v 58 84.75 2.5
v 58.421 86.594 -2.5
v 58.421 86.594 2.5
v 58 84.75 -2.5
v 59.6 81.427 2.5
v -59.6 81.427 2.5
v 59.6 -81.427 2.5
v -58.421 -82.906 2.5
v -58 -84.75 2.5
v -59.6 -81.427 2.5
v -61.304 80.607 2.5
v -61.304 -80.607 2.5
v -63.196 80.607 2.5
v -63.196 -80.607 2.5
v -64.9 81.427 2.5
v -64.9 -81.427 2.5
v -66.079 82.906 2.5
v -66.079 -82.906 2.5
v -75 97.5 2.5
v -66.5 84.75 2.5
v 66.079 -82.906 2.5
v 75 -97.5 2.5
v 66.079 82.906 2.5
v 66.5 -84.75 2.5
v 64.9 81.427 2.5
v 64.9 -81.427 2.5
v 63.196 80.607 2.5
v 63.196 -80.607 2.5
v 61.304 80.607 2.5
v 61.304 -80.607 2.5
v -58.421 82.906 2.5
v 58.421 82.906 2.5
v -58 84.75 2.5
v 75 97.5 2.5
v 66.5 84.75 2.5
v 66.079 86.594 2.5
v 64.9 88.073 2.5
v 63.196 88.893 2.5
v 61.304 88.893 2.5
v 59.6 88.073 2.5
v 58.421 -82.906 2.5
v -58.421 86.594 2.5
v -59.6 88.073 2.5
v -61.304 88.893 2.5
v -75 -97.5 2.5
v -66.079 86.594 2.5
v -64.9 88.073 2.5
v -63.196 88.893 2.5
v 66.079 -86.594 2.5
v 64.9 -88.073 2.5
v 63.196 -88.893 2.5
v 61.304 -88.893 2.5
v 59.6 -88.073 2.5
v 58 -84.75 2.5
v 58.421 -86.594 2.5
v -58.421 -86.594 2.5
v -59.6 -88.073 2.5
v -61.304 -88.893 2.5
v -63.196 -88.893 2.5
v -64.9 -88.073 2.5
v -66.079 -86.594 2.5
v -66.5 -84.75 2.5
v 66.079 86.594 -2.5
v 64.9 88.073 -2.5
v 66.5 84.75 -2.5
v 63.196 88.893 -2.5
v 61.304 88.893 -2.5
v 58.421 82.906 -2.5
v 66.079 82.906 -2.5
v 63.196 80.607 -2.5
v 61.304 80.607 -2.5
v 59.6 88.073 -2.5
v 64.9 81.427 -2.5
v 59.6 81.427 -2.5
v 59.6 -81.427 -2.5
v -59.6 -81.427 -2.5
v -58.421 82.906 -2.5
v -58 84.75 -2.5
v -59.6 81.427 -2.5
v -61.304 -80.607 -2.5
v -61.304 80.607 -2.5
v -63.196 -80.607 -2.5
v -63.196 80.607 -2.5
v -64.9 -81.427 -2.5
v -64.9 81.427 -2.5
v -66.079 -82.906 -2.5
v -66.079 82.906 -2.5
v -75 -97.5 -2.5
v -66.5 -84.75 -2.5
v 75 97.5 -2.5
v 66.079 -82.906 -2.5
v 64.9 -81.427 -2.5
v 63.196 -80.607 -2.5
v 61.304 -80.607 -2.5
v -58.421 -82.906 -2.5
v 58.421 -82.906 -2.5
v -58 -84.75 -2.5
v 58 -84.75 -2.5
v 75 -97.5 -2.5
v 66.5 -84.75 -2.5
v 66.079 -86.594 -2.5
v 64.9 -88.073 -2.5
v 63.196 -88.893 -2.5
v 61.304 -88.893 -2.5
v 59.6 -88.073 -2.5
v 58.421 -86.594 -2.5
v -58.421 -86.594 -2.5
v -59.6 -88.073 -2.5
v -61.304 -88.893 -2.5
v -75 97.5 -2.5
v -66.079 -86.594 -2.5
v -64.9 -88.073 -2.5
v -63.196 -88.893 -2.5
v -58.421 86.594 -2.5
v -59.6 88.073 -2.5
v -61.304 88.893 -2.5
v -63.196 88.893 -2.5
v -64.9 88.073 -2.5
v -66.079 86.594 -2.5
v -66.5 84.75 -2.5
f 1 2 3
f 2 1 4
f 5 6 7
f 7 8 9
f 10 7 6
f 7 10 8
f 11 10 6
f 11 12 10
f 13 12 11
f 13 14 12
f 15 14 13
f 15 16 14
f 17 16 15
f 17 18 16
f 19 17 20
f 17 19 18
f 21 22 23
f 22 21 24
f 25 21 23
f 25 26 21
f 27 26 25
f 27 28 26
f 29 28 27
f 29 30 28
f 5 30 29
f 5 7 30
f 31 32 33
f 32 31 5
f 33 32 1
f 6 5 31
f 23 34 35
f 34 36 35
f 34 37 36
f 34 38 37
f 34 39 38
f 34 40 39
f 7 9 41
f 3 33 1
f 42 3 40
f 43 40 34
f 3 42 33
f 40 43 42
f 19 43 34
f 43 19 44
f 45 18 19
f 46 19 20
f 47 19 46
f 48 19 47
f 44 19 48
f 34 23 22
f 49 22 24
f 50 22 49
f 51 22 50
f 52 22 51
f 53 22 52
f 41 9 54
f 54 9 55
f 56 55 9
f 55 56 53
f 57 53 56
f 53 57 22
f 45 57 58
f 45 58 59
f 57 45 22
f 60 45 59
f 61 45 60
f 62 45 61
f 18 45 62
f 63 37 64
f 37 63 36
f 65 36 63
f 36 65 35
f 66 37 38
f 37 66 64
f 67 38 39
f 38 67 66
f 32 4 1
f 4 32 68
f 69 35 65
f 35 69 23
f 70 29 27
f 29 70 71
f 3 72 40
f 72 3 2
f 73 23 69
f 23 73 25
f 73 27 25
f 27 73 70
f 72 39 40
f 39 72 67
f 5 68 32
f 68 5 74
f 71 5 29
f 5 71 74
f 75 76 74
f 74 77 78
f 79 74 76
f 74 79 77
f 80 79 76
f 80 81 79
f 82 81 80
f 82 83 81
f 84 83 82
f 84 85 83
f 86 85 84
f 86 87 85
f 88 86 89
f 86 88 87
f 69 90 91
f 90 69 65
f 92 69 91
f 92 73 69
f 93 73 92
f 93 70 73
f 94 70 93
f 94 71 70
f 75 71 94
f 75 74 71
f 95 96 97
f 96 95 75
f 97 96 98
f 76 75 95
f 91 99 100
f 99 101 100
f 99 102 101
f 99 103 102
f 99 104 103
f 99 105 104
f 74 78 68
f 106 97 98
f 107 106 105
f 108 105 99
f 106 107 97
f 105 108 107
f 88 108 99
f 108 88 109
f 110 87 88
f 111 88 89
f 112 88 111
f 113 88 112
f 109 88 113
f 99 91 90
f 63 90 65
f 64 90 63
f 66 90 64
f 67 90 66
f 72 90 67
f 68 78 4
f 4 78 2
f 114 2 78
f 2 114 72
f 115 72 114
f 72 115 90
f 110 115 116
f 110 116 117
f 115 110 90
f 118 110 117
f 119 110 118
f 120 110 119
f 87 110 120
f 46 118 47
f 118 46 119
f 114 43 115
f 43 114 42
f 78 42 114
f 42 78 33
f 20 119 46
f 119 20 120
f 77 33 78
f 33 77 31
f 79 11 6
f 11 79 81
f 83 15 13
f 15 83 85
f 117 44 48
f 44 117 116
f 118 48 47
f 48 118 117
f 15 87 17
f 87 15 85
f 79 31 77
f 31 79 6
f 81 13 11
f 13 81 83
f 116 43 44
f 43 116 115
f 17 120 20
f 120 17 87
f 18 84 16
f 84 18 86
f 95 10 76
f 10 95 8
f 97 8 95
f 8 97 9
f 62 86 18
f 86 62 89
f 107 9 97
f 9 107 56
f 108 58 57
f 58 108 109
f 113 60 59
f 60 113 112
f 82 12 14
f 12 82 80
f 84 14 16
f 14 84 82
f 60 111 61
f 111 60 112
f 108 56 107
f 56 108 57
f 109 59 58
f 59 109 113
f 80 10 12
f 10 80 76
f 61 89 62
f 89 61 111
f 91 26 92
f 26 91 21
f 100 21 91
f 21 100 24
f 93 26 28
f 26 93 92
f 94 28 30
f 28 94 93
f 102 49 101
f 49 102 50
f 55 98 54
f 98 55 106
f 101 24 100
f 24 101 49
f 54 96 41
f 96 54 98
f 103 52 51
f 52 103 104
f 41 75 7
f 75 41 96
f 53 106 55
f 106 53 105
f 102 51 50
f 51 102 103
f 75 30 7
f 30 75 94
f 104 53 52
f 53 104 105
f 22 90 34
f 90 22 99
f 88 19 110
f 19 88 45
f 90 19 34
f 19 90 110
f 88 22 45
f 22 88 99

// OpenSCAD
// Generated by SolidPython 1.1.3 on 2024-01-09 11:18:42


difference() {
	cube(center = true, size = [150, 195.0000000000, 5]);
	union() {
		translate(v = [62.2500000000, 84.7500000000]) {
			cylinder(center = true, h = 5, r = 4.2500000000);
		}
		translate(v = [-62.2500000000, 84.7500000000]) {
			cylinder(center = true, h = 5, r = 4.2500000000);
		}
		translate(v = [-62.2500000000, -84.7500000000]) {
			cylinder(center = true, h = 5, r = 4.2500000000);
		}
		translate(v = [62.2500000000, -84.7500000000]) {
			cylinder(center = true, h = 5, r = 4.2500000000);
		}
	}
}
/***********************************************
*********      SolidPython code:      **********
************************************************
 
import solid
import numpy as np
import numbers
import pudb
from solid.utils import *
import viewscad
import subprocess
import os
import os.path as osp
import math
import sys

chamfer_extrude=solid.import_scad("./chamfer_extrude.scad")
chamfer_extrude=chamfer_extrude.chamfer_extrude
r = viewscad.Renderer(width=800, height=800)

def debug(model,f_name,path="/home/ts/code/projects/mfd/designs/debug"):
    solid.scad_render_to_file(model,osp.join(path,f_name)+".scad")
#generate position list of wells using offset from center
wells_pos_from_center_4 = lambda offset: [[-offset,offset],
                                        [offset, offset],
                                        [-offset, -offset],
                                        [offset, -offset]]
wells_pos_from_center_2 = lambda offset: [[offset,0],
                                        [-offset,0]]

def make_well(dims,shape=None,height=None,dxf=False):
    def circle_cylinder():
        if dxf or (height is None):
            well = solid.circle(r=dims, segments=64)
        else:
            well = solid.cylinder(r=dims, h=height, segments=64, center = True)
        return well
    if dims is None:
        sys.exit("radius needs to be a number")
    if isinstance(dims, numbers.Number):
        well =circle_cylinder()
    elif len(dims)==1:
        if isinstance(dims[1], numbers.Number):
            well =circle_cylinder()
        else:
            sys.exit("radius needs to be a number")
    elif len(dims)==2:
        well = solid.square(dims,center = True)
    elif len(dims)==3:
        well = solid.cube(dims, center = True)
    return well

def wells_top_bottom(center_gap,device_dims=None,shape=None,height=None, positions = None, dxf = False,well_shape=None):
    if well_shape == None:
        well_shape = make_well(device_dims,shape=shape,height=height,dxf=dxf)
    wells = []
    if positions is None:
        offset = radius+radius/2.0
        positions = wells_pos_from_center_2(offset)
    if dxf or (height is None):
        height = 0
    for position in positions:
        if dxf:
            wells.append(solid.translate([position[0],position[1]])(well_shape))
        else:
            wells.append(solid.translate([position[0],position[1],height/2.0])(well_shape))
    return  union()(*wells)

#place wells in four corners 
def four_corner(radius,height=None, positions = None, dxf = False):
    #if well pos not specified set
    #to equally spaced by half radius
    if positions is None:
        offset = radius+radius/2.0
        positions = wells_pos_from_center_4(offset)
    if dxf or (height is None):
        height = 0
    #make wells at positions with specified radius and height
    wells = []
    for position in positions:
        #make circle if making dxf
        if dxf:
            well_shape = solid.circle(r=radius, segments=64)
            well_shape = solid.translate([position[0],position[1]])(well_shape)
        #if stl make cylinder
        else:
            well_shape = solid.cylinder(r=radius, h=height, segments=64, center = True)
            well_shape = solid.translate([position[0],position[1],height/2.0])(well_shape)
        wells.append(well_shape)
    return  union()(*wells)

#generate channels 
def make_channels(length,width,height=0,num_chans=1,max_chans=None,spacing=None, dxf = False,
                  rotate_channels=False):
    if dxf or (height is None):
        height = 0
    #if channel gap not defined, is equal to
    if spacing is None: spacing = width
    #calculate number of channels if fitting max num within given width
    if not max_chans is None:
        import math
        num_chans = math.floor((max_chans-spacing)/(width+spacing))
    #get total width of channel section  
    total_width = (width*num_chans)+(spacing*(num_chans-1))

    #make template channel
    #if rotate_channels: width, length = length, width
    if dxf:
        channel_t = solid.square([length,width],center = True)
    else:
        channel_t = solid.cube([length,width,height], center = True)

    #if number channels is even, offset the first channel to center its gap
    if num_chans % 2 == 0: centering = -(width/2.0+spacing/2.0)
    else: centering = 0
    #move template channel up to align bottom at z = 0 
    #and offset center if necessary
    if dxf:
        channel_t = solid.translate([0,centering])(channel_t)
    else:
        channel_t = solid.translate([0,centering,height/2.0])(channel_t)

    #if rotate_channels: length,width = width,length
    #start making the channels
    channels = []
    for i in range(num_chans):
        #if i=0 there is no translation
        #if i=1, we make the first channel adjacent to second
        direction = i

        #if i>=1, we add channels alternating left and right
        if i >= 1:
            direction = -(i/2.0)
            if i % 2 == 1: direction = (-direction)+0.5
                
        #make channel at right position and add it to channel list
        translation_coords = [0,direction*(width+spacing)]
        #if rotate_channels: translation_coords = [direction*(width+spacing),0]
        if dxf:
            channel = solid.translate(translation_coords)(channel_t)
        else:
            channel = solid.translate([*translation_coords,0])(channel_t)
        channels.append(channel)
    
    #group all channels as one object
    channels = union()(*channels)
    #compute the x,y,z dimensions in order to pass as arguments 
    #for construction of other parts of device (such as the chambers)
    measurements = {'x':(length/2.0,-length/2.0),
                    'y':(total_width/2.0,-total_width/2.0)}
    if not dxf:
        measurements['z'] = (height,0)
    if rotate_channels:
        channels = solid.rotate(90)(channels)
        measurements['x'],measurements['y']=measurements['y'],measurements['x']
    return channels,measurements

def make_chambers(msrs,height=None,extra=0,len_until=None,width=None, dxf = False):
    #computes x,y,z length
    total = lambda x : abs(x[0]) + abs(x[1])
    
    #if specific height if specified
    #otherwise use same height as channels
    if dxf:
        pass
    elif not height is None:
        msrs['z'] = (height,0)
    else:
        msrs['z'] = (0,0)
        
    #make copy of measurements from channels to modify chamber dimensions 
    #and add length to chambers as specified
    chamber_dims = msrs.copy()
    #calculate length of chamber to reach specified offset
    if not len_until is None:
        chamber_len = len_until-(msrs['x'][0])
    #or add specified length to channel length (if not specified, adds 0)
    else:
        chamber_len = msrs['x'][0]+extra
    #set the chamber length based 
    chamber_dims['x'] = (chamber_len/2.0,-(chamber_len/2.0))
    #compute final dimensions of chamber
    if not width is None:
        chamber_dims['y'] = (width/2.0,-width/2.0)
    chamber_dims = [total(size) for size in chamber_dims.values()]
        
    #calculate chamber translation offset to place adjacent to channels
    chamber_trslt = msrs['x'][0]+(chamber_len/2.0)
    #compute chamber translation coordinates to align with channels
    #x = 1 moves chamber above channels
    #x = -1 moves chamber below channels
    if dxf:
        trslt = lambda x : [x*(chamber_trslt),0]
    else:
        trslt = lambda x : [x*(chamber_trslt),0,msrs['z'][0]/2.0]
    
    #function to make chamber at top or at bottom 
    if dxf:
        move = lambda x : solid.translate(trslt(x))(solid.square(chamber_dims, center = True) )
    else:
        move = lambda x : solid.translate(trslt(x))(solid.cube(chamber_dims,center = True))
    #make top and bottom chambers and return them as grouped
    top = move(1)
    bottom = move(-1)
    #chambers=solid.rotate(90)(solid.union()(top,bottom))
    chambers=(solid.union()(top,bottom))

    return chambers

#create alignment features 
def alignment_features(unit,dims,grid_size, mask_size = None, alignment = "hollow", units_from_center = (2.5,2.5), corner_len=None):
    width = grid_size[0]*dims[0]
    length = grid_size[1]*dims[1]
    if mask_size is None and corner_len is None:
        corner_len = (dims[0] + dims[1]) /2 / 8
    corner = lambda thickness_div : solid.union()( solid.square([corner_len,corner_len/thickness_div],center=False), solid.square([corner_len/thickness_div,corner_len],center=False) )
    
    def make_full(thickness_div):
        thickness = corner_len/thickness_div
        tr = solid.translate([0, 0, 0 ])(solid.rotate(180)(corner(thickness_div)))
        tr = solid.translate([thickness/2,thickness/2,0])(tr)
        bl = solid.translate([0, 0, 0 ])(solid.rotate(0)(corner(thickness_div)))
        bl = solid.translate([-thickness/2,-thickness/2,0])(bl)
        return solid.union()(tr,bl)
    
    def make_hollow(thickness_div):
        thickness = corner_len/(thickness_div/2)
        inner = make_full(thickness_div)
        outer = make_full(thickness_div/2)
        hollow = outer - inner 
        return hollow
    
    center = (width /2 , length/2)
    mask_pos = lambda x,y : (center[0] + x*(float(units_from_center[0])*dims[0]), center[1] + y*(float(units_from_center[1])*dims[1]))
    positions = []
    positions.append(mask_pos(1,0))
    positions.append(mask_pos(0,1))
    positions.append(mask_pos(-1,0))
    positions.append(mask_pos(0,-1))
    make_mask = lambda mtype : make_hollow(8) if mtype == "hollow" else make_full(8)
    masks = [ solid.translate([*position,0])(make_mask(alignment)) for position in positions]
    
    solid.scad_render_to_file(solid.union()(*masks),"./designs/open_chamber/masks.scad")
    #return unit - solid.union()(*masks)
    return solid.union()(*masks,unit)

def create_outline(thickness, array, dims, grid_size,):
    width = grid_size[0]*dims[0] + thickness *2
    length = grid_size[1]*dims[1] + thickness *2
    outer = solid.translate([-thickness, -thickness,0])(solid.square([width, length]))
    return outer-array

def create_wall(wall_thickness, outline_thickness, dims, grid_size, wall_height = 2000, dxf = False):
    inner_width = grid_size[0]*dims[0] + outline_thickness *2
    inner_length = grid_size[1]*dims[1] + outline_thickness *2
    outer_width = inner_width + wall_thickness * 2
    outer_length = inner_length + wall_thickness * 2
    outer_pos_x = -outline_thickness-wall_thickness
    outer_pos_y = -outline_thickness-wall_thickness
    inner_pos_x = -outline_thickness
    inner_pos_y = -outline_thickness
    if dxf:
        inner_wall = solid.translate([inner_pos_x,
                                      inner_pos_y,
                                      0])(solid.square([inner_width, inner_length]))
        outer_wall = solid.translate([outer_pos_x,
                                      outer_pos_y,
                                      0])(solid.square([outer_width, outer_length]))

        return outer_wall-inner_wall
    else:
        inner_wall = solid.translate([inner_pos_x,
                                      inner_pos_y,
                                      0])(solid.cube([inner_width, inner_length,wall_height]))
        outer_wall = solid.translate([outer_pos_x,
                                      outer_pos_y,
                                      0])(solid.cube([outer_width, outer_length,wall_height]))

        return outer_wall-inner_wall, {'wall_height': wall_height,
                                       'wall_thickness': wall_thickness,
                                       'inner_width':inner_width,
                                       'inner_length': inner_length,
                                       'outer_width': outer_width,
                                       'outer_length': outer_length,
                                       'outer_pos_x' : outer_pos_x,
                                       'outer_pos_y' : outer_pos_y,
                                       'inner_pos_x' : inner_pos_x,
                                       'inner_pos_y' : inner_pos_y}

def create_thicker_wall(wall_thickness, outer_wall_offset, wall_dims, dims, grid_size, height_start = .2, height_end=2, dxf = False):
    addon_wall,thicker_wall_dims = create_wall(wall_thickness, outer_wall_offset, dims, grid_size, wall_height=height_end-height_start, dxf = False)
    addon_wall = solid.translate([0,0,height_start])(addon_wall)

    thicker_wall_dims['wall_height'] = height_end
    thicker_wall_dims['wall_thickness'] = wall_dims['wall_thickness'] + wall_thickness
    return addon_wall, thicker_wall_dims
 
def add_lock_to_wall(wall,wall_dims,y_offset = 0,cut_ratio=0.7,L_length=3, gap_ratio=0.05, axis="x",width_ratio=1/2):
    # Makes L shape
    def make_L(max_length,length_thickness,max_width,width_thickness,height,y_offset):
        length = solid.cube([max_length,length_thickness,height])
        width = solid.cube([width_thickness,max_width,height])
        width = solid.translate([max_length-(width_thickness),0,0])(width)
        L = solid.union()(width,length)
        debug(L,"L")
        if axis == "x":
            L = solid.rotate(-90)(L)
            L = solid.translate([0,max_length,0])(L)
        else:
            L = solid.rotate(-180)(L)
            L = solid.translate([max_length,max_width,0])(L)
        return solid.translate([0,0,y_offset])(L)
    
    lock_length = L_length
    lock_width = wall_dims['wall_thickness']*width_ratio
    lock_length_thickness = lock_width/2
    lock_width_thickness = lock_width/2
    L_lock = make_L(lock_length,lock_length_thickness,lock_width,lock_width_thickness, wall_dims['wall_height']-y_offset, y_offset)
    
    margin_space = lock_length - lock_length*(1-gap_ratio)
    key_length = lock_length-margin_space
    key_length_thickness = lock_length_thickness-(margin_space*2)
    key_width = lock_width-(margin_space*2)
    key_width_thickness = lock_width_thickness-(margin_space*2)
    L_key = make_L(key_length,key_length_thickness,key_width,key_width_thickness, wall_dims['wall_height']-y_offset, y_offset)
    L_key = solid.translate([margin_space,margin_space,0])(L_key)
    L = solid.union()(L_lock,L_key)
    debug(L,"L")
    
    #Make cube to be used as negative to split frame in a half
    #Can choose if making left or right negative, specify ratio of split
    def make_negative(right,cut_ratio):
        if axis == "x":
            if right:
                length = wall_dims['outer_length']*(1-cut_ratio)
                pos_x = wall_dims['outer_pos_x']+(wall_dims['outer_length']*cut_ratio)
            else:
                length = wall_dims['outer_length']*(cut_ratio)
                pos_x = wall_dims['outer_pos_x'] 
            negative = solid.cube([wall_dims['outer_width'],length, wall_dims['wall_height']])
            negative = solid.translate([wall_dims['outer_pos_y'],pos_x,0])(negative)
        else:
            if right:
                length = wall_dims['outer_width']*(1-cut_ratio)
                pos_x = wall_dims['outer_pos_y']+(wall_dims['outer_width']*cut_ratio)
            else:
                length = wall_dims['outer_width']*(cut_ratio)
                pos_x = wall_dims['outer_pos_y'] 
            negative = solid.cube([length,wall_dims['outer_length'], wall_dims['wall_height']])
            negative = solid.translate([pos_x,wall_dims['outer_pos_x'],0])(negative)
        return negative, pos_x, length 
                      
    #Make negatives
    negative_right, right_half_pos_x, right_half_length = make_negative(True,cut_ratio)
    negative_left, left_half_pos_x, right_half_length = make_negative(False,cut_ratio)
    #Make halves
    left_half = solid.difference()(wall,negative_right)
    right_half = solid.difference()(wall,negative_left)
    def place_L(L, L_length,L_width):
        #Place L on top wall       
        offset_to_center = (wall_dims['wall_thickness']-L_width)/2
        if axis == "x":
            y_pos_top = (wall_dims['outer_pos_y'] +
                    wall_dims['outer_width'] - 
                    L_width - offset_to_center)
            top_L = solid.translate([y_pos_top,
                                     right_half_pos_x-(L_length),
                                     0])(L)
            #Place L on bottom wall       
            y_pos_bottom = wall_dims['outer_pos_y']+offset_to_center
            bottom_L = solid.translate([y_pos_bottom,
                                        right_half_pos_x-L_length,
                                        0])(L)
        else:
            y_pos_top = (wall_dims['outer_pos_x'] +
                    wall_dims['outer_length'] -
                    (L_width+offset_to_center))
            top_L = solid.translate([right_half_pos_x-L_length,
                                     y_pos_top,
                                     0])(L)
            #Place L on bottom wall       
            y_pos_bottom = wall_dims['outer_pos_y']+offset_to_center
            bottom_L = solid.translate([right_half_pos_x-L_length,
                                        y_pos_bottom,
                                        0])(L)
        return bottom_L, top_L
    #Make complimentary L pieces through union and differences
    #Make Lock
    bottom_L_lock, top_L_lock = place_L(L_lock,L_length,lock_width)
    left_half = solid.difference()(left_half,bottom_L_lock)
    left_half = solid.difference()(left_half,top_L_lock)
    #Make Key
    bottom_L_key, top_L_key = place_L(L_key,L_length,lock_width)
    right_half = solid.union()(right_half,bottom_L_key)
    right_half = solid.union()(right_half,top_L_key)
    return left_half, right_half


#build a row x col grid of containment units
def make_unit_array(unit,dims,grid_size, dxf = False, alignment = None, mask_size = None,
                    units_from_center = None,alignment_offset=None, alignment_mark_size=1):
    units = []
    for col in range(grid_size[1]):
        for row in range(grid_size[0]):
            if dxf:
                units.append(solid.translate([row*dims[0],col*dims[1]])(unit))
            else:
                units.append(solid.translate([row*dims[0],col*dims[1],dims[2]/2.0])(unit))
    array = solid.union()(*units)
    if (not alignment is None) and dxf:
        if not alignment_offset is None:
            array = solid.translate([alignment_offset[0],alignment_offset[1]])(array)
        array = alignment_features(array,dims, grid_size, alignment = alignment, mask_size = None, units_from_center = units_from_center,corner_len=alignment_mark_size)
        if not alignment_offset is None:
            array = solid.translate([-alignment_offset[0],-alignment_offset[1]])(array)
    return array


def make_taylor(wells_pos = wells_pos_from_center_4(2.25), well_rad = 1.5 ,
                well_height = 2, chan_w = 0.01, chan_l = 1, chan_h = 0.010 ,
                chan_gap = 0.040, max_chans = None,num_chans=100, chamber_height  = 0.100,
                columns = 1, rows = 1, chamber_len_until=2.25, add_channels = True, add_wells = True, 
                add_chambers = True, save_path = "./", alignment = None, units_from_center = 2,
                mask_size = None, render_stl = False, outline_thickness = 0.050, dxf = True,
                wall_height = 15, wall_thickness = 0.95, casing_x=9, casing_y=9, casing_z=0,rotate_units=0):

    dims = [casing_x, casing_y, casing_z]
    wells = four_corner(well_rad,well_height, dxf = dxf, positions = wells_pos)
    debug(wells,"wells")
    channels, msrs = make_channels(chan_l,chan_w,chan_h,dxf=dxf, spacing = chan_gap, max_chans=max_chans,num_chans=num_chans)
    debug(channels,"channels")
    chambers = make_chambers(msrs,dxf = dxf, height=chamber_height,len_until=chamber_len_until)
    debug(chambers,"chambers")

    #add together and render
    device_parts = []
    if add_channels:
        device_parts.append(channels)
    if add_wells:
        device_parts.append(wells)
    if add_chambers:
        device_parts.append(chambers)
    device=union()(*device_parts)
    device = rotate(rotate_units)(device)

    device=solid.translate([dims[0]/2.0,dims[1]/2.0,0])(device)
    channels = rotate(rotate_units)(channels)
    channels=solid.translate([dims[0]/2,dims[1]/2,0])(channels)
    chambers_wells = union()(wells,chambers)
    chambers_wells = rotate(rotate_units)(chambers_wells)
    chambers_wells=solid.translate([dims[0]/2,dims[1]/2,0])(chambers_wells)

    file_name = str(rows)+'x'+str(columns)+'_units_'
    grid_size = [rows,columns]

    if alignment:
        alignment="full"
    device = make_unit_array(device,dims,grid_size, dxf=dxf, alignment = alignment,
                                 units_from_center = units_from_center)
    channels = make_unit_array(channels,dims,grid_size, dxf=dxf, alignment = alignment,
                                 units_from_center = units_from_center)
    if alignment=="full":
        alignment="hollow"

    chambers_wells = make_unit_array(chambers_wells,dims,grid_size, dxf=dxf, alignment = alignment,
                                 units_from_center =units_from_center)

    def save_model(model,prefix):
        model_fname = os.path.abspath(save_path+prefix+"_"+file_name+".scad")
        solid.scad_render_to_file(model,model_fname)
        return model_fname

    wells_fname = save_model(wells,"wells")
    channels_fname = save_model(channels,"channels")
    device_fname = save_model(device,"device")
    chambers_wells_fname = save_model(chambers_wells,"chambers_wells")
    return (chambers_wells,chambers_wells_fname), (channels,channels_fname), (device,device_fname)

def make_device(design='open',rows=8,columns=6,wells_pos = 4.5,well_offset=3.2, well_rad=3.2,well_height=0.1,
                chan_l=1,chan_w=0.01,chan_h=0.01,chan_gap=0.015,num_chans=101,dxf=True,save_path="./designs/open_chamber/",
                casing_x=9.0,casing_y=18.0,casing_z=0,rotate_units=90,units_from_center=(3,1),chamber_len_until=4.5,
                chamber_width=None,alignment=True, add_wells=True, add_channels=True,add_chambers=True,well_shape=None):

    dims = [casing_x, casing_y, casing_z]
    if design == "open":
        wells_pos=wells_pos_from_center_2(wells_pos)
        wells = wells_top_bottom(well_offset*2,device_dims=well_rad,height=well_height, dxf = dxf, positions = wells_pos,well_shape=well_shape)
    elif design == "closed":
        wells_pos=wells_pos_from_center_4(wells_pos)
        debug(wells,"wells")
        wells = four_corner(well_offset,well_height,device_dims=well_rad, dxf = dxf, positions = wells_pos)
    else:
        print(design+" is not a valid design.\n Choose valid design: 'open' or 'closed'")
        exit()
    wells = rotate(rotate_units)(wells)
    wells=solid.translate([dims[0]/2,dims[1]/2,0])(wells)
    debug(wells,"wells")

    channels, msrs = make_channels(chan_l,chan_w,chan_h,dxf=dxf, spacing = chan_gap, num_chans=num_chans,rotate_channels=False)
    channels = rotate(rotate_units)(channels)
    channels=solid.translate([dims[0]/2,dims[1]/2,0])(channels)

    chambers=make_chambers(msrs,height=None,extra=0,len_until=chamber_len_until, width=chamber_width,dxf = dxf)
    chambers = rotate(rotate_units)(chambers)
    chambers=solid.translate([dims[0]/2,dims[1]/2,0])(chambers)

    device_parts = []
    if add_channels:
        device_parts.append(channels)
    if add_wells:
        device_parts.append(wells)
    if add_chambers:
        device_parts.append(chambers)
    device = union()(*device_parts)
    #device = rotate(rotate_units)(device)
    #device=solid.translate([dims[0]/2.0,dims[1]/2.0,0])(device)

    chambers_wells = []
    if add_chambers:
        chambers_wells.append(chambers)
    if add_wells:
        chambers_wells.append(wells)
    chambers_wells = union()(*chambers_wells)
    #chambers_wells = union()(wells,chambers)
    #chambers_wells = rotate(rotate_units)(chambers_wells)
    #chambers_wells=solid.translate([dims[0]/2,dims[1]/2,0])(chambers_wells)

    file_name = str(rows)+'x'+str(columns)+'_units_'

    grid_size = [rows,columns]
    if alignment:
        alignment="full"
    device = make_unit_array(device,dims,grid_size, dxf=dxf, alignment = alignment,
                                 units_from_center = units_from_center)
    channels = make_unit_array(channels,dims,grid_size, dxf=dxf, alignment = alignment,
                                 units_from_center = units_from_center)
    if alignment=="full":
        alignment="hollow"

    chambers_wells = make_unit_array(chambers_wells,dims,grid_size, dxf=dxf, alignment = alignment,
                                 units_from_center =units_from_center)

    def save_model(model,prefix):
        model_fname = os.path.abspath(save_path+prefix+"_"+file_name+".scad")
        solid.scad_render_to_file(model,model_fname)
        return model_fname

    wells_fname = save_model(wells,"wells")
    channels_fname = save_model(channels,"channels")
    device_fname = save_model(device,"device")
    chambers_wells_fname = save_model(chambers_wells,"chambers_wells")
    return (chambers_wells,chambers_wells_fname), (channels,channels_fname), (device,device_fname)


def make_open_chamber(rows=8,columns=6,wells_pos = wells_pos_from_center_2(4.5), well_rad=3.2,well_height=0.1,
                      chan_l=1,chan_w=0.01,chan_h=0.01,chan_gap=0.015,num_chans=101,dxf=True,save_path="./designs/open_chamber/",
                      casing_x=9.0,casing_y=18.0,casing_z=0,rotate_units=90,units_from_center=(3,1),chamber_len_until=4.5,
                      chamber_width=None,alignment=True, add_wells=True, add_channels=True,add_chambers=True,well_shape=None):

    dims = [casing_x, casing_y, casing_z]
    wells = wells_top_bottom(well_rad,height=well_height, dxf = dxf, positions = wells_pos, well_shape=well_shape)
    channels, msrs = make_channels(chan_l,chan_w,chan_h,dxf=dxf, spacing = chan_gap, num_chans=num_chans,rotate_channels=False)
    chambers=make_chambers(msrs,height=None,extra=0,len_until=chamber_len_until, width=chamber_width,dxf = dxf)
    debug(chambers,"chambers")
    device_parts = []
    if add_channels:
        device_parts.append(channels)
    if add_wells:
        device_parts.append(wells)
    if add_chambers:
        device_parts.append(chambers)
    device = union()(*device_parts)
    device = rotate(rotate_units)(device)
    device=solid.translate([dims[0]/2.0,dims[1]/2.0,0])(device)
    channels = rotate(rotate_units)(channels)
    channels=solid.translate([dims[0]/2,dims[1]/2,0])(channels)
    chambers_wells = union()(wells,chambers)
    chambers_wells = rotate(rotate_units)(chambers_wells)
    chambers_wells=solid.translate([dims[0]/2,dims[1]/2,0])(chambers_wells)

    file_name = str(rows)+'x'+str(columns)+'_units_'

    grid_size = [rows,columns]
    if alignment:
        alignment="full"
    device = make_unit_array(device,dims,grid_size, dxf=dxf, alignment = alignment,
                                 units_from_center = units_from_center)
    channels = make_unit_array(channels,dims,grid_size, dxf=dxf, alignment = alignment,
                                 units_from_center = units_from_center)
    if alignment=="full":
        alignment="hollow"

    chambers_wells = make_unit_array(chambers_wells,dims,grid_size, dxf=dxf, alignment = alignment,
                                 units_from_center =units_from_center)

    def save_model(model,prefix):
        model_fname = os.path.abspath(save_path+prefix+"_"+file_name+".scad")
        solid.scad_render_to_file(model,model_fname)
        return model_fname

    wells_fname = save_model(wells,"wells")
    channels_fname = save_model(channels,"channels")
    device_fname = save_model(device,"device")
    chambers_wells_fname = save_model(chambers_wells,"chambers_wells")
    return (chambers_wells,chambers_wells_fname), (channels,channels_fname), (device,device_fname)

def to_dxf(scad_path):
    dxf_path = scad_path.replace(".scad",".dxf")
    subprocess.call(["openscad", "-o", dxf_path, scad_path])
    import ezdxf
    temp_dxf = ezdxf.readfile(dxf_path)
    temp_dxf.saveas(dxf_path)

#def make_walls(diameter,thickness,grid_size,dims,height=20,segments=256,make_inner=True):
#    wafer_wall_out = solid.cylinder(r=diameter/2,h=height, segments=segments)
#    wafer_wall_in = solid.cylinder(r=(diameter/2-thickness),h=height, segments=segments)
#    wafer_wall = solid.difference()(wafer_wall_out,wafer_wall_in)
#    wafer_wall = solid.translate([grid_size[1]*dims[1]/2.0,grid_size[0]*dims[0]/2.0])(wafer_wall)
#
#    vertical_wall_length = grid_size[1]*dims[1]
#    horizontal_wall_length = grid_size[0]*dims[0]
#    vertical_wall = solid.cube([vertical_wall_length,thickness,height],center = True)
#    vertical_wall = solid.translate([vertical_wall_length/2,0,height/2])(vertical_wall)
#    horizontal_wall = solid.cube([thickness,horizontal_wall_length,height],center = True)
#    horizontal_wall = solid.translate([0,vertical_wall_length/2,height/2])(horizontal_wall)
#    walls = []
#    walls.append(horizontal_wall)
#    walls.append(vertical_wall)
#    for col in range(grid_size[1]):
#        if col == grid_size[1]-1: 
#            walls.append(solid.translate([0,(col+1)*dims[1]])(vertical_wall))
#        elif col > 0 and col < grid_size[1]-1 and make_inner==True:
#            walls.append(solid.translate([0,(col+1)*dims[1]])(vertical_wall))
#    for row in range(grid_size[0]):
#        if row == grid_size[0]-1: 
#            walls.append(solid.translate([(row+1)*dims[0],0])(horizontal_wall))
#        elif row > 0 and row < grid_size[0]-1 and make_inner==True:
#            walls.append(solid.translate([(row+1)*dims[0],0])(horizontal_wall))
#    walls = union()(*walls)
#    wafer_walls = union()(walls,wafer_wall)
#    return walls,wafer_wall,wafer_walls

def make_walls(diameter,thickness,grid_size,dims,height=20,segments=256,make_inner=True,padx=0,pady=0):
    wafer_wall_out = solid.cylinder(r=diameter/2,h=height, segments=segments)
    wafer_wall_in = solid.cylinder(r=(diameter/2-thickness),h=height, segments=segments)
    wafer_wall = solid.difference()(wafer_wall_out,wafer_wall_in)
    wafer_wall = solid.translate([grid_size[1]*dims[1]/2.0,grid_size[0]*dims[0]/2.0])(wafer_wall)

    vertical_wall_length = grid_size[0]*dims[0]+padx
    horizontal_wall_length = grid_size[1]*dims[1]+pady
    vertical_wall = solid.cube([vertical_wall_length,thickness,height],center = True)
    vertical_wall = solid.translate([vertical_wall_length/2-pady/2,-padx/2,height/2])(vertical_wall)
    horizontal_wall = solid.cube([thickness,horizontal_wall_length,height],center = True)
    horizontal_wall = solid.translate([-pady/2,horizontal_wall_length/2-padx/2,height/2])(horizontal_wall)
    walls = []
    walls.append(horizontal_wall)
    walls.append(vertical_wall)
    for col in range(grid_size[1]):
        if col == grid_size[1]-1: 
            walls.append(solid.translate([0,(col+1)*dims[1]+pady])(vertical_wall))
        elif col > 0 and col < grid_size[1]-1 and make_inner==True:
            walls.append(solid.translate([0,(col+1)*dims[1]])(vertical_wall))
    for row in range(grid_size[0]):
        if row == grid_size[0]-1: 
            walls.append(solid.translate([(row+1)*dims[0]+padx,0])(horizontal_wall))
        elif row > 0 and row < grid_size[0]-1 and make_inner==True:
            walls.append(solid.translate([(row+1)*dims[0],0])(horizontal_wall))
    walls = union()(*walls)
    wafer_walls = union()(walls,wafer_wall)
    return walls,wafer_wall,wafer_walls

def save_model(model,base_path,base_name,dxf=True):
    if not os.path.exists(base_path):
        os.makedirs(base_path)
    dxf_path=osp.join(base_path,base_name+".scad")
    solid.scad_render_to_file(model,osp.join(dxf_path))
    if dxf:
        to_dxf(dxf_path)

def make_wafer(diameter,flat_len,thickness):
    wafer = solid.cylinder(r1=diameter/2,r2=diameter/2,h=thickness,segments=512,)()
    x_start_flat=(flat_len/2)
    y_start_flat = math.sqrt(((diameter/2)**2) - (x_start_flat**2) )
    height_delete_flat=diameter/2-y_start_flat
    flat_delete = solid.cube([flat_len,height_delete_flat,thickness],center=False)()
    flat_delete = solid.translate([-flat_len/2,y_start_flat,0])(flat_delete)
    wafer = solid.difference()(wafer,flat_delete)
    wafer = solid.rotate(90)(wafer)
    return wafer

def add_wafer_to_mask(wafer_size,flat_len,mask,grid_size,dims,wafer_line_thickness=0.1,outer_mask_thickness=5,alignment_offset=None):
    def make_wafer_mask(wafer_size,flat_len):
        wafer_mask = make_wafer(wafer_size,flat_len,1)
        wafer_mask = solid.projection()(wafer_mask)
        wafer_mask = solid.translate([grid_size[0]*dims[0]/2.0,grid_size[1]*dims[1]/2.0])(wafer_mask)
        if not alignment_offset is None:
            wafer_mask = solid.translate([-alignment_offset[0],-alignment_offset[1]])(wafer_mask)
        return wafer_mask

    inner_wafer_line_mask = make_wafer_mask(wafer_size-wafer_line_thickness/2,flat_len)
    outer_wafer_line_mask = make_wafer_mask(wafer_size+wafer_line_thickness/2,flat_len)
    outer_wafer_mask = make_wafer_mask(wafer_size+outer_mask_thickness,flat_len)
    outer_wafer_mask = solid.difference()(outer_wafer_mask,outer_wafer_line_mask)
    wafer_mask = solid.union()(outer_wafer_mask,inner_wafer_line_mask)

    return solid.difference()(wafer_mask,mask)

def make_posts(post_shape,post_height):
    posts = solid.linear_extrude(height=post_height)(post_shape)
    return posts

def make_wafer_empty(diameter,flat_len,thickness,margin,notch_len=20,notch_height=5,oversize=1.01):
    diameter*=oversize
    flat_len*=oversize
    wafer = make_wafer(diameter,flat_len,thickness)
    holder = solid.cylinder(r1=diameter/2+margin,r2=diameter/2+margin,h=thickness,segments=512)()
    holder = solid.difference()(holder,wafer)

    x_start_flat=(flat_len/2)
    y_start_flat = math.sqrt(((diameter/2)**2) - (x_start_flat**2) )
    height_delete_flat=diameter/2-y_start_flat
    notch = solid.cube([notch_len,notch_height,thickness],center=False)()
    notch = solid.translate([-notch_len/2,y_start_flat,0])(notch)
    notch = solid.rotate(90)(notch)
    return solid.difference()(holder,notch)

def wafer_print_calibration(diameter,thickness,height,z_offset):
    circles = []
    radii = []
    radii.append(diameter/2.0*0.8)
    radii.append(diameter/2.0*0.6)
    radii.append(diameter/2.0*0.4)
    radii.append(diameter/2.0*0.2)
    for radius in radii:
        inner = solid.cylinder(r1=radius-(thickness/2.0),r2=radius-(thickness/2.0),h=thickness,segments=512,)()
        outer = solid.cylinder(r1=radius+(thickness/2.0),r2=radius+(thickness/2.0),h=thickness,segments=512,)()
        diff = solid.difference()(outer,inner)
        circles.append(diff)
    circles = solid.union()(*circles)
    circles = solid.translate([0,0,z_offset])(circles)
    return circles

def make_rack(wells,dims,grid_size,alignment_offset,rack_x,rack_y,rack_thickness,bolt_width,add_bolts=True):

    #get X and Y dimensions of gride of pipette tips
    X_len = dims[0]*grid_size[0]
    Y_len = dims[1]*grid_size[1]
    #make rack
    rack = solid.cube([rack_x,rack_y,rack_thickness],center=True)

    if add_bolts:
    #add bolt holes
        bolt_hole=solid.cylinder(r=bolt_width/2,h=rack_thickness,center=True)()
        bolt_holes = []
        bolt_holes.append(solid.translate([rack_x/2-1.5*bolt_width,rack_y/2-1.5*bolt_width])(bolt_hole))
        bolt_holes.append(solid.translate([-rack_x/2+1.5*bolt_width,rack_y/2-1.5*bolt_width])(bolt_hole))
        bolt_holes.append(solid.translate([-rack_x/2+1.5*bolt_width,-rack_y/2+1.5*bolt_width])(bolt_hole))
        bolt_holes.append(solid.translate([rack_x/2-1.5*bolt_width,-rack_y/2+1.5*bolt_width])(bolt_hole))
        bolt_holes = solid.union()(*bolt_holes)
        rack=solid.difference()(rack,bolt_holes)
    rack_support = rack

    #center rack with pipette holes
    rack = solid.translate([0,0,rack_thickness/2])(rack)
    rack = solid.translate([X_len/2,Y_len/2])(rack)
    rack = solid.translate([-alignment_offset[0],-alignment_offset[1]])(rack)
    wells = solid.linear_extrude(height=rack_thickness)(wells)
    rack = solid.difference()(rack,wells)
    return rack, rack_support

def make_pillar(wells,dims,grid_size,alignment_offset,rack_x,rack_y,pillar_height,rack_thickness,bolt_width,add_bolts=True,taper_angle=1,bolt_position_corner=1.5):

    #get X and Y dimensions of gride of pipette tips
    X_len = dims[0]*grid_size[0]
    Y_len = dims[1]*grid_size[1]
    #make rack
    rack = solid.cube([rack_x,rack_y,rack_thickness],center=True)
    
    if add_bolts:
    #add bolt holes
        bolt_hole=solid.cylinder(r=bolt_width/2,h=rack_thickness,center=True)()
        bolt_holes = []
        bolt_holes.append(solid.translate([rack_x/2-bolt_position_corner*bolt_width,rack_y/2-bolt_position_corner*bolt_width])(bolt_hole))
        bolt_holes.append(solid.translate([-rack_x/2+bolt_position_corner*bolt_width,rack_y/2-bolt_position_corner*bolt_width])(bolt_hole))
        bolt_holes.append(solid.translate([-rack_x/2+bolt_position_corner*bolt_width,-rack_y/2+bolt_position_corner*bolt_width])(bolt_hole))
        bolt_holes.append(solid.translate([rack_x/2-bolt_position_corner*bolt_width,-rack_y/2+bolt_position_corner*bolt_width])(bolt_hole))
        bolt_holes = solid.union()(*bolt_holes)
        rack=solid.difference()(rack,bolt_holes)
    rack_support = rack

    #center rack with pipette holes
    #rack = solid.translate([0,0,-rack_thickness])(rack)
    rack = solid.translate([X_len/2,Y_len/2])(rack)
    rack = solid.translate([-alignment_offset[0],-alignment_offset[1]])(rack)
    if not taper_angle == 0:
        wells=chamfer_extrude(pillar_height,taper_angle,segments=20)(wells)
    else:
        wells = solid.linear_extrude(height=pillar_height)(wells)
    rack = solid.union()(rack,wells)
    return rack, rack_support

def deg_taper_len(height,deg):
    if not deg == 0:
        return height*math.tan(math.radians(deg))
    else:
        return 0

def make_outline(inner_dims,wall_thickness,grid_size,dims,alignment_offset):
    inner_dims=np.array(inner_dims)
    inner_outline=solid.square(inner_dims,center=True)
    outer_dims=inner_dims+wall_thickness
    outer_outline=solid.square(outer_dims,center=True)
    outline=solid.difference()(outer_outline,inner_outline)
    outline=solid.translate([grid_size[0]*dims[0]/2.0,grid_size[1]*dims[1]/2.0])(outline)
    return outline








 
 
************************************************/
